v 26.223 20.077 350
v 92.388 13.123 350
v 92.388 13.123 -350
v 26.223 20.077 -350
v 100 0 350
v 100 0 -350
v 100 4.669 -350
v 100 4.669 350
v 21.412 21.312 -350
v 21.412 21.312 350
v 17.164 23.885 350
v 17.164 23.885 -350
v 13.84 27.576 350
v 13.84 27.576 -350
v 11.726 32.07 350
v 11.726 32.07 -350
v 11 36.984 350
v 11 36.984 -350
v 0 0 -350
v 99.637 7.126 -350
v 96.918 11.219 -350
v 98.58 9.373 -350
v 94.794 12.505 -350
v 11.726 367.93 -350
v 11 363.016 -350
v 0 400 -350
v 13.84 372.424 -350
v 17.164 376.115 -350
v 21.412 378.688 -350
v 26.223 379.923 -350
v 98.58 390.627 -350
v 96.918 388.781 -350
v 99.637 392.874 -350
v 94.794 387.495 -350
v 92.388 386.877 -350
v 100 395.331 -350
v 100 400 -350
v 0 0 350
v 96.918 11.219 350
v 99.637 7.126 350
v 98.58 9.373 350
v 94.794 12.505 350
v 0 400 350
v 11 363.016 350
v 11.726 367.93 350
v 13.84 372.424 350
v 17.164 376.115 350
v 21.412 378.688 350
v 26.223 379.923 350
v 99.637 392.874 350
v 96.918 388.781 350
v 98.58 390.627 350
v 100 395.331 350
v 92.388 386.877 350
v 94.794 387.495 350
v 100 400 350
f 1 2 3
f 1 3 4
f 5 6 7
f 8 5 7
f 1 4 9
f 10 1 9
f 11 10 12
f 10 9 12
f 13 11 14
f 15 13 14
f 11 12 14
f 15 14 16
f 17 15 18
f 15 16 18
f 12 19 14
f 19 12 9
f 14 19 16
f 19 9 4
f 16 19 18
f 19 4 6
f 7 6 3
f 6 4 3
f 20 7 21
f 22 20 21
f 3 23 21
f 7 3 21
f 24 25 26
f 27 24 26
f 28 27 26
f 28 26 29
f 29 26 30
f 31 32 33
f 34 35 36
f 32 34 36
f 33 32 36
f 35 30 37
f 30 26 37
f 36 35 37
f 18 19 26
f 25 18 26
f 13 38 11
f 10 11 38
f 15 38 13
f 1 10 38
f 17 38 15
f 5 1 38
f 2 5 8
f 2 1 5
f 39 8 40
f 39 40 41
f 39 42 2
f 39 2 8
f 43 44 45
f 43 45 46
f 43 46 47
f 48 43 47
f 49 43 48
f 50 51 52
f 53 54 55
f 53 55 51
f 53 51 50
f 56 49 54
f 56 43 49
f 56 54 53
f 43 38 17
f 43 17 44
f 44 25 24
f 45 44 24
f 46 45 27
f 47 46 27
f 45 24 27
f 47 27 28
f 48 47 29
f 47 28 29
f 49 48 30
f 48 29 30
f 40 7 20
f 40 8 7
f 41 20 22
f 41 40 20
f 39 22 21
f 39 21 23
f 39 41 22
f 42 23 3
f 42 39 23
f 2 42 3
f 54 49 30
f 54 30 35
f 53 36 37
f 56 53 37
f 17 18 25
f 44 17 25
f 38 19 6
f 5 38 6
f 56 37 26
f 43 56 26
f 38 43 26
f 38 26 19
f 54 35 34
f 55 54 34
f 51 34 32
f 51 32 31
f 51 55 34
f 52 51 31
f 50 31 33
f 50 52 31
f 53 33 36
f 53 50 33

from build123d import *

# Parameters (mm, degrees)
BASEMCHANNEL_START = -350
BASEMCHANNEL_DEPTH = 700
TOEFILLET_R        = 8.5


# Read off the part's stored shape, not the designer's step: BaseMchannel
with BuildPart() as part:
    # BaseMchannel outline → BaseMchannel (new body)
    with BuildSketch(Plane.XY.offset(BASEMCHANNEL_START)):
        with BuildLine():
            Line((0, 400), (0, 0))
            Line((0, 0), (100, 0))
            Line((100, 0), (100, 12.322861527))
            Line((100, 12.322861527), (26.223016124, 20.077134998))
            ThreePointArc((26.223016124, 20.077134998), (15.366537967, 25.608786911), (11, 36.984007219))
            Line((11, 36.984007219), (11, 363.015992781))
            ThreePointArc((11, 363.015992781), (15.366537967, 374.391213089), (26.223016124, 379.922865002))
            Line((26.223016124, 379.922865002), (100, 387.677138473))
            Line((100, 387.677138473), (100, 400))
            Line((100, 400), (0, 400))
        make_face()
    extrude(amount=BASEMCHANNEL_DEPTH)

    # ToeFillet
    toefillet_edges = [part.edges().sort_by_distance(p)[0] for p in [
        (100, 387.677138473, 0),
        (100, 12.322861527, 0),
    ]]
    fillet(toefillet_edges, radius=TOEFILLET_R)


solid = part.part
